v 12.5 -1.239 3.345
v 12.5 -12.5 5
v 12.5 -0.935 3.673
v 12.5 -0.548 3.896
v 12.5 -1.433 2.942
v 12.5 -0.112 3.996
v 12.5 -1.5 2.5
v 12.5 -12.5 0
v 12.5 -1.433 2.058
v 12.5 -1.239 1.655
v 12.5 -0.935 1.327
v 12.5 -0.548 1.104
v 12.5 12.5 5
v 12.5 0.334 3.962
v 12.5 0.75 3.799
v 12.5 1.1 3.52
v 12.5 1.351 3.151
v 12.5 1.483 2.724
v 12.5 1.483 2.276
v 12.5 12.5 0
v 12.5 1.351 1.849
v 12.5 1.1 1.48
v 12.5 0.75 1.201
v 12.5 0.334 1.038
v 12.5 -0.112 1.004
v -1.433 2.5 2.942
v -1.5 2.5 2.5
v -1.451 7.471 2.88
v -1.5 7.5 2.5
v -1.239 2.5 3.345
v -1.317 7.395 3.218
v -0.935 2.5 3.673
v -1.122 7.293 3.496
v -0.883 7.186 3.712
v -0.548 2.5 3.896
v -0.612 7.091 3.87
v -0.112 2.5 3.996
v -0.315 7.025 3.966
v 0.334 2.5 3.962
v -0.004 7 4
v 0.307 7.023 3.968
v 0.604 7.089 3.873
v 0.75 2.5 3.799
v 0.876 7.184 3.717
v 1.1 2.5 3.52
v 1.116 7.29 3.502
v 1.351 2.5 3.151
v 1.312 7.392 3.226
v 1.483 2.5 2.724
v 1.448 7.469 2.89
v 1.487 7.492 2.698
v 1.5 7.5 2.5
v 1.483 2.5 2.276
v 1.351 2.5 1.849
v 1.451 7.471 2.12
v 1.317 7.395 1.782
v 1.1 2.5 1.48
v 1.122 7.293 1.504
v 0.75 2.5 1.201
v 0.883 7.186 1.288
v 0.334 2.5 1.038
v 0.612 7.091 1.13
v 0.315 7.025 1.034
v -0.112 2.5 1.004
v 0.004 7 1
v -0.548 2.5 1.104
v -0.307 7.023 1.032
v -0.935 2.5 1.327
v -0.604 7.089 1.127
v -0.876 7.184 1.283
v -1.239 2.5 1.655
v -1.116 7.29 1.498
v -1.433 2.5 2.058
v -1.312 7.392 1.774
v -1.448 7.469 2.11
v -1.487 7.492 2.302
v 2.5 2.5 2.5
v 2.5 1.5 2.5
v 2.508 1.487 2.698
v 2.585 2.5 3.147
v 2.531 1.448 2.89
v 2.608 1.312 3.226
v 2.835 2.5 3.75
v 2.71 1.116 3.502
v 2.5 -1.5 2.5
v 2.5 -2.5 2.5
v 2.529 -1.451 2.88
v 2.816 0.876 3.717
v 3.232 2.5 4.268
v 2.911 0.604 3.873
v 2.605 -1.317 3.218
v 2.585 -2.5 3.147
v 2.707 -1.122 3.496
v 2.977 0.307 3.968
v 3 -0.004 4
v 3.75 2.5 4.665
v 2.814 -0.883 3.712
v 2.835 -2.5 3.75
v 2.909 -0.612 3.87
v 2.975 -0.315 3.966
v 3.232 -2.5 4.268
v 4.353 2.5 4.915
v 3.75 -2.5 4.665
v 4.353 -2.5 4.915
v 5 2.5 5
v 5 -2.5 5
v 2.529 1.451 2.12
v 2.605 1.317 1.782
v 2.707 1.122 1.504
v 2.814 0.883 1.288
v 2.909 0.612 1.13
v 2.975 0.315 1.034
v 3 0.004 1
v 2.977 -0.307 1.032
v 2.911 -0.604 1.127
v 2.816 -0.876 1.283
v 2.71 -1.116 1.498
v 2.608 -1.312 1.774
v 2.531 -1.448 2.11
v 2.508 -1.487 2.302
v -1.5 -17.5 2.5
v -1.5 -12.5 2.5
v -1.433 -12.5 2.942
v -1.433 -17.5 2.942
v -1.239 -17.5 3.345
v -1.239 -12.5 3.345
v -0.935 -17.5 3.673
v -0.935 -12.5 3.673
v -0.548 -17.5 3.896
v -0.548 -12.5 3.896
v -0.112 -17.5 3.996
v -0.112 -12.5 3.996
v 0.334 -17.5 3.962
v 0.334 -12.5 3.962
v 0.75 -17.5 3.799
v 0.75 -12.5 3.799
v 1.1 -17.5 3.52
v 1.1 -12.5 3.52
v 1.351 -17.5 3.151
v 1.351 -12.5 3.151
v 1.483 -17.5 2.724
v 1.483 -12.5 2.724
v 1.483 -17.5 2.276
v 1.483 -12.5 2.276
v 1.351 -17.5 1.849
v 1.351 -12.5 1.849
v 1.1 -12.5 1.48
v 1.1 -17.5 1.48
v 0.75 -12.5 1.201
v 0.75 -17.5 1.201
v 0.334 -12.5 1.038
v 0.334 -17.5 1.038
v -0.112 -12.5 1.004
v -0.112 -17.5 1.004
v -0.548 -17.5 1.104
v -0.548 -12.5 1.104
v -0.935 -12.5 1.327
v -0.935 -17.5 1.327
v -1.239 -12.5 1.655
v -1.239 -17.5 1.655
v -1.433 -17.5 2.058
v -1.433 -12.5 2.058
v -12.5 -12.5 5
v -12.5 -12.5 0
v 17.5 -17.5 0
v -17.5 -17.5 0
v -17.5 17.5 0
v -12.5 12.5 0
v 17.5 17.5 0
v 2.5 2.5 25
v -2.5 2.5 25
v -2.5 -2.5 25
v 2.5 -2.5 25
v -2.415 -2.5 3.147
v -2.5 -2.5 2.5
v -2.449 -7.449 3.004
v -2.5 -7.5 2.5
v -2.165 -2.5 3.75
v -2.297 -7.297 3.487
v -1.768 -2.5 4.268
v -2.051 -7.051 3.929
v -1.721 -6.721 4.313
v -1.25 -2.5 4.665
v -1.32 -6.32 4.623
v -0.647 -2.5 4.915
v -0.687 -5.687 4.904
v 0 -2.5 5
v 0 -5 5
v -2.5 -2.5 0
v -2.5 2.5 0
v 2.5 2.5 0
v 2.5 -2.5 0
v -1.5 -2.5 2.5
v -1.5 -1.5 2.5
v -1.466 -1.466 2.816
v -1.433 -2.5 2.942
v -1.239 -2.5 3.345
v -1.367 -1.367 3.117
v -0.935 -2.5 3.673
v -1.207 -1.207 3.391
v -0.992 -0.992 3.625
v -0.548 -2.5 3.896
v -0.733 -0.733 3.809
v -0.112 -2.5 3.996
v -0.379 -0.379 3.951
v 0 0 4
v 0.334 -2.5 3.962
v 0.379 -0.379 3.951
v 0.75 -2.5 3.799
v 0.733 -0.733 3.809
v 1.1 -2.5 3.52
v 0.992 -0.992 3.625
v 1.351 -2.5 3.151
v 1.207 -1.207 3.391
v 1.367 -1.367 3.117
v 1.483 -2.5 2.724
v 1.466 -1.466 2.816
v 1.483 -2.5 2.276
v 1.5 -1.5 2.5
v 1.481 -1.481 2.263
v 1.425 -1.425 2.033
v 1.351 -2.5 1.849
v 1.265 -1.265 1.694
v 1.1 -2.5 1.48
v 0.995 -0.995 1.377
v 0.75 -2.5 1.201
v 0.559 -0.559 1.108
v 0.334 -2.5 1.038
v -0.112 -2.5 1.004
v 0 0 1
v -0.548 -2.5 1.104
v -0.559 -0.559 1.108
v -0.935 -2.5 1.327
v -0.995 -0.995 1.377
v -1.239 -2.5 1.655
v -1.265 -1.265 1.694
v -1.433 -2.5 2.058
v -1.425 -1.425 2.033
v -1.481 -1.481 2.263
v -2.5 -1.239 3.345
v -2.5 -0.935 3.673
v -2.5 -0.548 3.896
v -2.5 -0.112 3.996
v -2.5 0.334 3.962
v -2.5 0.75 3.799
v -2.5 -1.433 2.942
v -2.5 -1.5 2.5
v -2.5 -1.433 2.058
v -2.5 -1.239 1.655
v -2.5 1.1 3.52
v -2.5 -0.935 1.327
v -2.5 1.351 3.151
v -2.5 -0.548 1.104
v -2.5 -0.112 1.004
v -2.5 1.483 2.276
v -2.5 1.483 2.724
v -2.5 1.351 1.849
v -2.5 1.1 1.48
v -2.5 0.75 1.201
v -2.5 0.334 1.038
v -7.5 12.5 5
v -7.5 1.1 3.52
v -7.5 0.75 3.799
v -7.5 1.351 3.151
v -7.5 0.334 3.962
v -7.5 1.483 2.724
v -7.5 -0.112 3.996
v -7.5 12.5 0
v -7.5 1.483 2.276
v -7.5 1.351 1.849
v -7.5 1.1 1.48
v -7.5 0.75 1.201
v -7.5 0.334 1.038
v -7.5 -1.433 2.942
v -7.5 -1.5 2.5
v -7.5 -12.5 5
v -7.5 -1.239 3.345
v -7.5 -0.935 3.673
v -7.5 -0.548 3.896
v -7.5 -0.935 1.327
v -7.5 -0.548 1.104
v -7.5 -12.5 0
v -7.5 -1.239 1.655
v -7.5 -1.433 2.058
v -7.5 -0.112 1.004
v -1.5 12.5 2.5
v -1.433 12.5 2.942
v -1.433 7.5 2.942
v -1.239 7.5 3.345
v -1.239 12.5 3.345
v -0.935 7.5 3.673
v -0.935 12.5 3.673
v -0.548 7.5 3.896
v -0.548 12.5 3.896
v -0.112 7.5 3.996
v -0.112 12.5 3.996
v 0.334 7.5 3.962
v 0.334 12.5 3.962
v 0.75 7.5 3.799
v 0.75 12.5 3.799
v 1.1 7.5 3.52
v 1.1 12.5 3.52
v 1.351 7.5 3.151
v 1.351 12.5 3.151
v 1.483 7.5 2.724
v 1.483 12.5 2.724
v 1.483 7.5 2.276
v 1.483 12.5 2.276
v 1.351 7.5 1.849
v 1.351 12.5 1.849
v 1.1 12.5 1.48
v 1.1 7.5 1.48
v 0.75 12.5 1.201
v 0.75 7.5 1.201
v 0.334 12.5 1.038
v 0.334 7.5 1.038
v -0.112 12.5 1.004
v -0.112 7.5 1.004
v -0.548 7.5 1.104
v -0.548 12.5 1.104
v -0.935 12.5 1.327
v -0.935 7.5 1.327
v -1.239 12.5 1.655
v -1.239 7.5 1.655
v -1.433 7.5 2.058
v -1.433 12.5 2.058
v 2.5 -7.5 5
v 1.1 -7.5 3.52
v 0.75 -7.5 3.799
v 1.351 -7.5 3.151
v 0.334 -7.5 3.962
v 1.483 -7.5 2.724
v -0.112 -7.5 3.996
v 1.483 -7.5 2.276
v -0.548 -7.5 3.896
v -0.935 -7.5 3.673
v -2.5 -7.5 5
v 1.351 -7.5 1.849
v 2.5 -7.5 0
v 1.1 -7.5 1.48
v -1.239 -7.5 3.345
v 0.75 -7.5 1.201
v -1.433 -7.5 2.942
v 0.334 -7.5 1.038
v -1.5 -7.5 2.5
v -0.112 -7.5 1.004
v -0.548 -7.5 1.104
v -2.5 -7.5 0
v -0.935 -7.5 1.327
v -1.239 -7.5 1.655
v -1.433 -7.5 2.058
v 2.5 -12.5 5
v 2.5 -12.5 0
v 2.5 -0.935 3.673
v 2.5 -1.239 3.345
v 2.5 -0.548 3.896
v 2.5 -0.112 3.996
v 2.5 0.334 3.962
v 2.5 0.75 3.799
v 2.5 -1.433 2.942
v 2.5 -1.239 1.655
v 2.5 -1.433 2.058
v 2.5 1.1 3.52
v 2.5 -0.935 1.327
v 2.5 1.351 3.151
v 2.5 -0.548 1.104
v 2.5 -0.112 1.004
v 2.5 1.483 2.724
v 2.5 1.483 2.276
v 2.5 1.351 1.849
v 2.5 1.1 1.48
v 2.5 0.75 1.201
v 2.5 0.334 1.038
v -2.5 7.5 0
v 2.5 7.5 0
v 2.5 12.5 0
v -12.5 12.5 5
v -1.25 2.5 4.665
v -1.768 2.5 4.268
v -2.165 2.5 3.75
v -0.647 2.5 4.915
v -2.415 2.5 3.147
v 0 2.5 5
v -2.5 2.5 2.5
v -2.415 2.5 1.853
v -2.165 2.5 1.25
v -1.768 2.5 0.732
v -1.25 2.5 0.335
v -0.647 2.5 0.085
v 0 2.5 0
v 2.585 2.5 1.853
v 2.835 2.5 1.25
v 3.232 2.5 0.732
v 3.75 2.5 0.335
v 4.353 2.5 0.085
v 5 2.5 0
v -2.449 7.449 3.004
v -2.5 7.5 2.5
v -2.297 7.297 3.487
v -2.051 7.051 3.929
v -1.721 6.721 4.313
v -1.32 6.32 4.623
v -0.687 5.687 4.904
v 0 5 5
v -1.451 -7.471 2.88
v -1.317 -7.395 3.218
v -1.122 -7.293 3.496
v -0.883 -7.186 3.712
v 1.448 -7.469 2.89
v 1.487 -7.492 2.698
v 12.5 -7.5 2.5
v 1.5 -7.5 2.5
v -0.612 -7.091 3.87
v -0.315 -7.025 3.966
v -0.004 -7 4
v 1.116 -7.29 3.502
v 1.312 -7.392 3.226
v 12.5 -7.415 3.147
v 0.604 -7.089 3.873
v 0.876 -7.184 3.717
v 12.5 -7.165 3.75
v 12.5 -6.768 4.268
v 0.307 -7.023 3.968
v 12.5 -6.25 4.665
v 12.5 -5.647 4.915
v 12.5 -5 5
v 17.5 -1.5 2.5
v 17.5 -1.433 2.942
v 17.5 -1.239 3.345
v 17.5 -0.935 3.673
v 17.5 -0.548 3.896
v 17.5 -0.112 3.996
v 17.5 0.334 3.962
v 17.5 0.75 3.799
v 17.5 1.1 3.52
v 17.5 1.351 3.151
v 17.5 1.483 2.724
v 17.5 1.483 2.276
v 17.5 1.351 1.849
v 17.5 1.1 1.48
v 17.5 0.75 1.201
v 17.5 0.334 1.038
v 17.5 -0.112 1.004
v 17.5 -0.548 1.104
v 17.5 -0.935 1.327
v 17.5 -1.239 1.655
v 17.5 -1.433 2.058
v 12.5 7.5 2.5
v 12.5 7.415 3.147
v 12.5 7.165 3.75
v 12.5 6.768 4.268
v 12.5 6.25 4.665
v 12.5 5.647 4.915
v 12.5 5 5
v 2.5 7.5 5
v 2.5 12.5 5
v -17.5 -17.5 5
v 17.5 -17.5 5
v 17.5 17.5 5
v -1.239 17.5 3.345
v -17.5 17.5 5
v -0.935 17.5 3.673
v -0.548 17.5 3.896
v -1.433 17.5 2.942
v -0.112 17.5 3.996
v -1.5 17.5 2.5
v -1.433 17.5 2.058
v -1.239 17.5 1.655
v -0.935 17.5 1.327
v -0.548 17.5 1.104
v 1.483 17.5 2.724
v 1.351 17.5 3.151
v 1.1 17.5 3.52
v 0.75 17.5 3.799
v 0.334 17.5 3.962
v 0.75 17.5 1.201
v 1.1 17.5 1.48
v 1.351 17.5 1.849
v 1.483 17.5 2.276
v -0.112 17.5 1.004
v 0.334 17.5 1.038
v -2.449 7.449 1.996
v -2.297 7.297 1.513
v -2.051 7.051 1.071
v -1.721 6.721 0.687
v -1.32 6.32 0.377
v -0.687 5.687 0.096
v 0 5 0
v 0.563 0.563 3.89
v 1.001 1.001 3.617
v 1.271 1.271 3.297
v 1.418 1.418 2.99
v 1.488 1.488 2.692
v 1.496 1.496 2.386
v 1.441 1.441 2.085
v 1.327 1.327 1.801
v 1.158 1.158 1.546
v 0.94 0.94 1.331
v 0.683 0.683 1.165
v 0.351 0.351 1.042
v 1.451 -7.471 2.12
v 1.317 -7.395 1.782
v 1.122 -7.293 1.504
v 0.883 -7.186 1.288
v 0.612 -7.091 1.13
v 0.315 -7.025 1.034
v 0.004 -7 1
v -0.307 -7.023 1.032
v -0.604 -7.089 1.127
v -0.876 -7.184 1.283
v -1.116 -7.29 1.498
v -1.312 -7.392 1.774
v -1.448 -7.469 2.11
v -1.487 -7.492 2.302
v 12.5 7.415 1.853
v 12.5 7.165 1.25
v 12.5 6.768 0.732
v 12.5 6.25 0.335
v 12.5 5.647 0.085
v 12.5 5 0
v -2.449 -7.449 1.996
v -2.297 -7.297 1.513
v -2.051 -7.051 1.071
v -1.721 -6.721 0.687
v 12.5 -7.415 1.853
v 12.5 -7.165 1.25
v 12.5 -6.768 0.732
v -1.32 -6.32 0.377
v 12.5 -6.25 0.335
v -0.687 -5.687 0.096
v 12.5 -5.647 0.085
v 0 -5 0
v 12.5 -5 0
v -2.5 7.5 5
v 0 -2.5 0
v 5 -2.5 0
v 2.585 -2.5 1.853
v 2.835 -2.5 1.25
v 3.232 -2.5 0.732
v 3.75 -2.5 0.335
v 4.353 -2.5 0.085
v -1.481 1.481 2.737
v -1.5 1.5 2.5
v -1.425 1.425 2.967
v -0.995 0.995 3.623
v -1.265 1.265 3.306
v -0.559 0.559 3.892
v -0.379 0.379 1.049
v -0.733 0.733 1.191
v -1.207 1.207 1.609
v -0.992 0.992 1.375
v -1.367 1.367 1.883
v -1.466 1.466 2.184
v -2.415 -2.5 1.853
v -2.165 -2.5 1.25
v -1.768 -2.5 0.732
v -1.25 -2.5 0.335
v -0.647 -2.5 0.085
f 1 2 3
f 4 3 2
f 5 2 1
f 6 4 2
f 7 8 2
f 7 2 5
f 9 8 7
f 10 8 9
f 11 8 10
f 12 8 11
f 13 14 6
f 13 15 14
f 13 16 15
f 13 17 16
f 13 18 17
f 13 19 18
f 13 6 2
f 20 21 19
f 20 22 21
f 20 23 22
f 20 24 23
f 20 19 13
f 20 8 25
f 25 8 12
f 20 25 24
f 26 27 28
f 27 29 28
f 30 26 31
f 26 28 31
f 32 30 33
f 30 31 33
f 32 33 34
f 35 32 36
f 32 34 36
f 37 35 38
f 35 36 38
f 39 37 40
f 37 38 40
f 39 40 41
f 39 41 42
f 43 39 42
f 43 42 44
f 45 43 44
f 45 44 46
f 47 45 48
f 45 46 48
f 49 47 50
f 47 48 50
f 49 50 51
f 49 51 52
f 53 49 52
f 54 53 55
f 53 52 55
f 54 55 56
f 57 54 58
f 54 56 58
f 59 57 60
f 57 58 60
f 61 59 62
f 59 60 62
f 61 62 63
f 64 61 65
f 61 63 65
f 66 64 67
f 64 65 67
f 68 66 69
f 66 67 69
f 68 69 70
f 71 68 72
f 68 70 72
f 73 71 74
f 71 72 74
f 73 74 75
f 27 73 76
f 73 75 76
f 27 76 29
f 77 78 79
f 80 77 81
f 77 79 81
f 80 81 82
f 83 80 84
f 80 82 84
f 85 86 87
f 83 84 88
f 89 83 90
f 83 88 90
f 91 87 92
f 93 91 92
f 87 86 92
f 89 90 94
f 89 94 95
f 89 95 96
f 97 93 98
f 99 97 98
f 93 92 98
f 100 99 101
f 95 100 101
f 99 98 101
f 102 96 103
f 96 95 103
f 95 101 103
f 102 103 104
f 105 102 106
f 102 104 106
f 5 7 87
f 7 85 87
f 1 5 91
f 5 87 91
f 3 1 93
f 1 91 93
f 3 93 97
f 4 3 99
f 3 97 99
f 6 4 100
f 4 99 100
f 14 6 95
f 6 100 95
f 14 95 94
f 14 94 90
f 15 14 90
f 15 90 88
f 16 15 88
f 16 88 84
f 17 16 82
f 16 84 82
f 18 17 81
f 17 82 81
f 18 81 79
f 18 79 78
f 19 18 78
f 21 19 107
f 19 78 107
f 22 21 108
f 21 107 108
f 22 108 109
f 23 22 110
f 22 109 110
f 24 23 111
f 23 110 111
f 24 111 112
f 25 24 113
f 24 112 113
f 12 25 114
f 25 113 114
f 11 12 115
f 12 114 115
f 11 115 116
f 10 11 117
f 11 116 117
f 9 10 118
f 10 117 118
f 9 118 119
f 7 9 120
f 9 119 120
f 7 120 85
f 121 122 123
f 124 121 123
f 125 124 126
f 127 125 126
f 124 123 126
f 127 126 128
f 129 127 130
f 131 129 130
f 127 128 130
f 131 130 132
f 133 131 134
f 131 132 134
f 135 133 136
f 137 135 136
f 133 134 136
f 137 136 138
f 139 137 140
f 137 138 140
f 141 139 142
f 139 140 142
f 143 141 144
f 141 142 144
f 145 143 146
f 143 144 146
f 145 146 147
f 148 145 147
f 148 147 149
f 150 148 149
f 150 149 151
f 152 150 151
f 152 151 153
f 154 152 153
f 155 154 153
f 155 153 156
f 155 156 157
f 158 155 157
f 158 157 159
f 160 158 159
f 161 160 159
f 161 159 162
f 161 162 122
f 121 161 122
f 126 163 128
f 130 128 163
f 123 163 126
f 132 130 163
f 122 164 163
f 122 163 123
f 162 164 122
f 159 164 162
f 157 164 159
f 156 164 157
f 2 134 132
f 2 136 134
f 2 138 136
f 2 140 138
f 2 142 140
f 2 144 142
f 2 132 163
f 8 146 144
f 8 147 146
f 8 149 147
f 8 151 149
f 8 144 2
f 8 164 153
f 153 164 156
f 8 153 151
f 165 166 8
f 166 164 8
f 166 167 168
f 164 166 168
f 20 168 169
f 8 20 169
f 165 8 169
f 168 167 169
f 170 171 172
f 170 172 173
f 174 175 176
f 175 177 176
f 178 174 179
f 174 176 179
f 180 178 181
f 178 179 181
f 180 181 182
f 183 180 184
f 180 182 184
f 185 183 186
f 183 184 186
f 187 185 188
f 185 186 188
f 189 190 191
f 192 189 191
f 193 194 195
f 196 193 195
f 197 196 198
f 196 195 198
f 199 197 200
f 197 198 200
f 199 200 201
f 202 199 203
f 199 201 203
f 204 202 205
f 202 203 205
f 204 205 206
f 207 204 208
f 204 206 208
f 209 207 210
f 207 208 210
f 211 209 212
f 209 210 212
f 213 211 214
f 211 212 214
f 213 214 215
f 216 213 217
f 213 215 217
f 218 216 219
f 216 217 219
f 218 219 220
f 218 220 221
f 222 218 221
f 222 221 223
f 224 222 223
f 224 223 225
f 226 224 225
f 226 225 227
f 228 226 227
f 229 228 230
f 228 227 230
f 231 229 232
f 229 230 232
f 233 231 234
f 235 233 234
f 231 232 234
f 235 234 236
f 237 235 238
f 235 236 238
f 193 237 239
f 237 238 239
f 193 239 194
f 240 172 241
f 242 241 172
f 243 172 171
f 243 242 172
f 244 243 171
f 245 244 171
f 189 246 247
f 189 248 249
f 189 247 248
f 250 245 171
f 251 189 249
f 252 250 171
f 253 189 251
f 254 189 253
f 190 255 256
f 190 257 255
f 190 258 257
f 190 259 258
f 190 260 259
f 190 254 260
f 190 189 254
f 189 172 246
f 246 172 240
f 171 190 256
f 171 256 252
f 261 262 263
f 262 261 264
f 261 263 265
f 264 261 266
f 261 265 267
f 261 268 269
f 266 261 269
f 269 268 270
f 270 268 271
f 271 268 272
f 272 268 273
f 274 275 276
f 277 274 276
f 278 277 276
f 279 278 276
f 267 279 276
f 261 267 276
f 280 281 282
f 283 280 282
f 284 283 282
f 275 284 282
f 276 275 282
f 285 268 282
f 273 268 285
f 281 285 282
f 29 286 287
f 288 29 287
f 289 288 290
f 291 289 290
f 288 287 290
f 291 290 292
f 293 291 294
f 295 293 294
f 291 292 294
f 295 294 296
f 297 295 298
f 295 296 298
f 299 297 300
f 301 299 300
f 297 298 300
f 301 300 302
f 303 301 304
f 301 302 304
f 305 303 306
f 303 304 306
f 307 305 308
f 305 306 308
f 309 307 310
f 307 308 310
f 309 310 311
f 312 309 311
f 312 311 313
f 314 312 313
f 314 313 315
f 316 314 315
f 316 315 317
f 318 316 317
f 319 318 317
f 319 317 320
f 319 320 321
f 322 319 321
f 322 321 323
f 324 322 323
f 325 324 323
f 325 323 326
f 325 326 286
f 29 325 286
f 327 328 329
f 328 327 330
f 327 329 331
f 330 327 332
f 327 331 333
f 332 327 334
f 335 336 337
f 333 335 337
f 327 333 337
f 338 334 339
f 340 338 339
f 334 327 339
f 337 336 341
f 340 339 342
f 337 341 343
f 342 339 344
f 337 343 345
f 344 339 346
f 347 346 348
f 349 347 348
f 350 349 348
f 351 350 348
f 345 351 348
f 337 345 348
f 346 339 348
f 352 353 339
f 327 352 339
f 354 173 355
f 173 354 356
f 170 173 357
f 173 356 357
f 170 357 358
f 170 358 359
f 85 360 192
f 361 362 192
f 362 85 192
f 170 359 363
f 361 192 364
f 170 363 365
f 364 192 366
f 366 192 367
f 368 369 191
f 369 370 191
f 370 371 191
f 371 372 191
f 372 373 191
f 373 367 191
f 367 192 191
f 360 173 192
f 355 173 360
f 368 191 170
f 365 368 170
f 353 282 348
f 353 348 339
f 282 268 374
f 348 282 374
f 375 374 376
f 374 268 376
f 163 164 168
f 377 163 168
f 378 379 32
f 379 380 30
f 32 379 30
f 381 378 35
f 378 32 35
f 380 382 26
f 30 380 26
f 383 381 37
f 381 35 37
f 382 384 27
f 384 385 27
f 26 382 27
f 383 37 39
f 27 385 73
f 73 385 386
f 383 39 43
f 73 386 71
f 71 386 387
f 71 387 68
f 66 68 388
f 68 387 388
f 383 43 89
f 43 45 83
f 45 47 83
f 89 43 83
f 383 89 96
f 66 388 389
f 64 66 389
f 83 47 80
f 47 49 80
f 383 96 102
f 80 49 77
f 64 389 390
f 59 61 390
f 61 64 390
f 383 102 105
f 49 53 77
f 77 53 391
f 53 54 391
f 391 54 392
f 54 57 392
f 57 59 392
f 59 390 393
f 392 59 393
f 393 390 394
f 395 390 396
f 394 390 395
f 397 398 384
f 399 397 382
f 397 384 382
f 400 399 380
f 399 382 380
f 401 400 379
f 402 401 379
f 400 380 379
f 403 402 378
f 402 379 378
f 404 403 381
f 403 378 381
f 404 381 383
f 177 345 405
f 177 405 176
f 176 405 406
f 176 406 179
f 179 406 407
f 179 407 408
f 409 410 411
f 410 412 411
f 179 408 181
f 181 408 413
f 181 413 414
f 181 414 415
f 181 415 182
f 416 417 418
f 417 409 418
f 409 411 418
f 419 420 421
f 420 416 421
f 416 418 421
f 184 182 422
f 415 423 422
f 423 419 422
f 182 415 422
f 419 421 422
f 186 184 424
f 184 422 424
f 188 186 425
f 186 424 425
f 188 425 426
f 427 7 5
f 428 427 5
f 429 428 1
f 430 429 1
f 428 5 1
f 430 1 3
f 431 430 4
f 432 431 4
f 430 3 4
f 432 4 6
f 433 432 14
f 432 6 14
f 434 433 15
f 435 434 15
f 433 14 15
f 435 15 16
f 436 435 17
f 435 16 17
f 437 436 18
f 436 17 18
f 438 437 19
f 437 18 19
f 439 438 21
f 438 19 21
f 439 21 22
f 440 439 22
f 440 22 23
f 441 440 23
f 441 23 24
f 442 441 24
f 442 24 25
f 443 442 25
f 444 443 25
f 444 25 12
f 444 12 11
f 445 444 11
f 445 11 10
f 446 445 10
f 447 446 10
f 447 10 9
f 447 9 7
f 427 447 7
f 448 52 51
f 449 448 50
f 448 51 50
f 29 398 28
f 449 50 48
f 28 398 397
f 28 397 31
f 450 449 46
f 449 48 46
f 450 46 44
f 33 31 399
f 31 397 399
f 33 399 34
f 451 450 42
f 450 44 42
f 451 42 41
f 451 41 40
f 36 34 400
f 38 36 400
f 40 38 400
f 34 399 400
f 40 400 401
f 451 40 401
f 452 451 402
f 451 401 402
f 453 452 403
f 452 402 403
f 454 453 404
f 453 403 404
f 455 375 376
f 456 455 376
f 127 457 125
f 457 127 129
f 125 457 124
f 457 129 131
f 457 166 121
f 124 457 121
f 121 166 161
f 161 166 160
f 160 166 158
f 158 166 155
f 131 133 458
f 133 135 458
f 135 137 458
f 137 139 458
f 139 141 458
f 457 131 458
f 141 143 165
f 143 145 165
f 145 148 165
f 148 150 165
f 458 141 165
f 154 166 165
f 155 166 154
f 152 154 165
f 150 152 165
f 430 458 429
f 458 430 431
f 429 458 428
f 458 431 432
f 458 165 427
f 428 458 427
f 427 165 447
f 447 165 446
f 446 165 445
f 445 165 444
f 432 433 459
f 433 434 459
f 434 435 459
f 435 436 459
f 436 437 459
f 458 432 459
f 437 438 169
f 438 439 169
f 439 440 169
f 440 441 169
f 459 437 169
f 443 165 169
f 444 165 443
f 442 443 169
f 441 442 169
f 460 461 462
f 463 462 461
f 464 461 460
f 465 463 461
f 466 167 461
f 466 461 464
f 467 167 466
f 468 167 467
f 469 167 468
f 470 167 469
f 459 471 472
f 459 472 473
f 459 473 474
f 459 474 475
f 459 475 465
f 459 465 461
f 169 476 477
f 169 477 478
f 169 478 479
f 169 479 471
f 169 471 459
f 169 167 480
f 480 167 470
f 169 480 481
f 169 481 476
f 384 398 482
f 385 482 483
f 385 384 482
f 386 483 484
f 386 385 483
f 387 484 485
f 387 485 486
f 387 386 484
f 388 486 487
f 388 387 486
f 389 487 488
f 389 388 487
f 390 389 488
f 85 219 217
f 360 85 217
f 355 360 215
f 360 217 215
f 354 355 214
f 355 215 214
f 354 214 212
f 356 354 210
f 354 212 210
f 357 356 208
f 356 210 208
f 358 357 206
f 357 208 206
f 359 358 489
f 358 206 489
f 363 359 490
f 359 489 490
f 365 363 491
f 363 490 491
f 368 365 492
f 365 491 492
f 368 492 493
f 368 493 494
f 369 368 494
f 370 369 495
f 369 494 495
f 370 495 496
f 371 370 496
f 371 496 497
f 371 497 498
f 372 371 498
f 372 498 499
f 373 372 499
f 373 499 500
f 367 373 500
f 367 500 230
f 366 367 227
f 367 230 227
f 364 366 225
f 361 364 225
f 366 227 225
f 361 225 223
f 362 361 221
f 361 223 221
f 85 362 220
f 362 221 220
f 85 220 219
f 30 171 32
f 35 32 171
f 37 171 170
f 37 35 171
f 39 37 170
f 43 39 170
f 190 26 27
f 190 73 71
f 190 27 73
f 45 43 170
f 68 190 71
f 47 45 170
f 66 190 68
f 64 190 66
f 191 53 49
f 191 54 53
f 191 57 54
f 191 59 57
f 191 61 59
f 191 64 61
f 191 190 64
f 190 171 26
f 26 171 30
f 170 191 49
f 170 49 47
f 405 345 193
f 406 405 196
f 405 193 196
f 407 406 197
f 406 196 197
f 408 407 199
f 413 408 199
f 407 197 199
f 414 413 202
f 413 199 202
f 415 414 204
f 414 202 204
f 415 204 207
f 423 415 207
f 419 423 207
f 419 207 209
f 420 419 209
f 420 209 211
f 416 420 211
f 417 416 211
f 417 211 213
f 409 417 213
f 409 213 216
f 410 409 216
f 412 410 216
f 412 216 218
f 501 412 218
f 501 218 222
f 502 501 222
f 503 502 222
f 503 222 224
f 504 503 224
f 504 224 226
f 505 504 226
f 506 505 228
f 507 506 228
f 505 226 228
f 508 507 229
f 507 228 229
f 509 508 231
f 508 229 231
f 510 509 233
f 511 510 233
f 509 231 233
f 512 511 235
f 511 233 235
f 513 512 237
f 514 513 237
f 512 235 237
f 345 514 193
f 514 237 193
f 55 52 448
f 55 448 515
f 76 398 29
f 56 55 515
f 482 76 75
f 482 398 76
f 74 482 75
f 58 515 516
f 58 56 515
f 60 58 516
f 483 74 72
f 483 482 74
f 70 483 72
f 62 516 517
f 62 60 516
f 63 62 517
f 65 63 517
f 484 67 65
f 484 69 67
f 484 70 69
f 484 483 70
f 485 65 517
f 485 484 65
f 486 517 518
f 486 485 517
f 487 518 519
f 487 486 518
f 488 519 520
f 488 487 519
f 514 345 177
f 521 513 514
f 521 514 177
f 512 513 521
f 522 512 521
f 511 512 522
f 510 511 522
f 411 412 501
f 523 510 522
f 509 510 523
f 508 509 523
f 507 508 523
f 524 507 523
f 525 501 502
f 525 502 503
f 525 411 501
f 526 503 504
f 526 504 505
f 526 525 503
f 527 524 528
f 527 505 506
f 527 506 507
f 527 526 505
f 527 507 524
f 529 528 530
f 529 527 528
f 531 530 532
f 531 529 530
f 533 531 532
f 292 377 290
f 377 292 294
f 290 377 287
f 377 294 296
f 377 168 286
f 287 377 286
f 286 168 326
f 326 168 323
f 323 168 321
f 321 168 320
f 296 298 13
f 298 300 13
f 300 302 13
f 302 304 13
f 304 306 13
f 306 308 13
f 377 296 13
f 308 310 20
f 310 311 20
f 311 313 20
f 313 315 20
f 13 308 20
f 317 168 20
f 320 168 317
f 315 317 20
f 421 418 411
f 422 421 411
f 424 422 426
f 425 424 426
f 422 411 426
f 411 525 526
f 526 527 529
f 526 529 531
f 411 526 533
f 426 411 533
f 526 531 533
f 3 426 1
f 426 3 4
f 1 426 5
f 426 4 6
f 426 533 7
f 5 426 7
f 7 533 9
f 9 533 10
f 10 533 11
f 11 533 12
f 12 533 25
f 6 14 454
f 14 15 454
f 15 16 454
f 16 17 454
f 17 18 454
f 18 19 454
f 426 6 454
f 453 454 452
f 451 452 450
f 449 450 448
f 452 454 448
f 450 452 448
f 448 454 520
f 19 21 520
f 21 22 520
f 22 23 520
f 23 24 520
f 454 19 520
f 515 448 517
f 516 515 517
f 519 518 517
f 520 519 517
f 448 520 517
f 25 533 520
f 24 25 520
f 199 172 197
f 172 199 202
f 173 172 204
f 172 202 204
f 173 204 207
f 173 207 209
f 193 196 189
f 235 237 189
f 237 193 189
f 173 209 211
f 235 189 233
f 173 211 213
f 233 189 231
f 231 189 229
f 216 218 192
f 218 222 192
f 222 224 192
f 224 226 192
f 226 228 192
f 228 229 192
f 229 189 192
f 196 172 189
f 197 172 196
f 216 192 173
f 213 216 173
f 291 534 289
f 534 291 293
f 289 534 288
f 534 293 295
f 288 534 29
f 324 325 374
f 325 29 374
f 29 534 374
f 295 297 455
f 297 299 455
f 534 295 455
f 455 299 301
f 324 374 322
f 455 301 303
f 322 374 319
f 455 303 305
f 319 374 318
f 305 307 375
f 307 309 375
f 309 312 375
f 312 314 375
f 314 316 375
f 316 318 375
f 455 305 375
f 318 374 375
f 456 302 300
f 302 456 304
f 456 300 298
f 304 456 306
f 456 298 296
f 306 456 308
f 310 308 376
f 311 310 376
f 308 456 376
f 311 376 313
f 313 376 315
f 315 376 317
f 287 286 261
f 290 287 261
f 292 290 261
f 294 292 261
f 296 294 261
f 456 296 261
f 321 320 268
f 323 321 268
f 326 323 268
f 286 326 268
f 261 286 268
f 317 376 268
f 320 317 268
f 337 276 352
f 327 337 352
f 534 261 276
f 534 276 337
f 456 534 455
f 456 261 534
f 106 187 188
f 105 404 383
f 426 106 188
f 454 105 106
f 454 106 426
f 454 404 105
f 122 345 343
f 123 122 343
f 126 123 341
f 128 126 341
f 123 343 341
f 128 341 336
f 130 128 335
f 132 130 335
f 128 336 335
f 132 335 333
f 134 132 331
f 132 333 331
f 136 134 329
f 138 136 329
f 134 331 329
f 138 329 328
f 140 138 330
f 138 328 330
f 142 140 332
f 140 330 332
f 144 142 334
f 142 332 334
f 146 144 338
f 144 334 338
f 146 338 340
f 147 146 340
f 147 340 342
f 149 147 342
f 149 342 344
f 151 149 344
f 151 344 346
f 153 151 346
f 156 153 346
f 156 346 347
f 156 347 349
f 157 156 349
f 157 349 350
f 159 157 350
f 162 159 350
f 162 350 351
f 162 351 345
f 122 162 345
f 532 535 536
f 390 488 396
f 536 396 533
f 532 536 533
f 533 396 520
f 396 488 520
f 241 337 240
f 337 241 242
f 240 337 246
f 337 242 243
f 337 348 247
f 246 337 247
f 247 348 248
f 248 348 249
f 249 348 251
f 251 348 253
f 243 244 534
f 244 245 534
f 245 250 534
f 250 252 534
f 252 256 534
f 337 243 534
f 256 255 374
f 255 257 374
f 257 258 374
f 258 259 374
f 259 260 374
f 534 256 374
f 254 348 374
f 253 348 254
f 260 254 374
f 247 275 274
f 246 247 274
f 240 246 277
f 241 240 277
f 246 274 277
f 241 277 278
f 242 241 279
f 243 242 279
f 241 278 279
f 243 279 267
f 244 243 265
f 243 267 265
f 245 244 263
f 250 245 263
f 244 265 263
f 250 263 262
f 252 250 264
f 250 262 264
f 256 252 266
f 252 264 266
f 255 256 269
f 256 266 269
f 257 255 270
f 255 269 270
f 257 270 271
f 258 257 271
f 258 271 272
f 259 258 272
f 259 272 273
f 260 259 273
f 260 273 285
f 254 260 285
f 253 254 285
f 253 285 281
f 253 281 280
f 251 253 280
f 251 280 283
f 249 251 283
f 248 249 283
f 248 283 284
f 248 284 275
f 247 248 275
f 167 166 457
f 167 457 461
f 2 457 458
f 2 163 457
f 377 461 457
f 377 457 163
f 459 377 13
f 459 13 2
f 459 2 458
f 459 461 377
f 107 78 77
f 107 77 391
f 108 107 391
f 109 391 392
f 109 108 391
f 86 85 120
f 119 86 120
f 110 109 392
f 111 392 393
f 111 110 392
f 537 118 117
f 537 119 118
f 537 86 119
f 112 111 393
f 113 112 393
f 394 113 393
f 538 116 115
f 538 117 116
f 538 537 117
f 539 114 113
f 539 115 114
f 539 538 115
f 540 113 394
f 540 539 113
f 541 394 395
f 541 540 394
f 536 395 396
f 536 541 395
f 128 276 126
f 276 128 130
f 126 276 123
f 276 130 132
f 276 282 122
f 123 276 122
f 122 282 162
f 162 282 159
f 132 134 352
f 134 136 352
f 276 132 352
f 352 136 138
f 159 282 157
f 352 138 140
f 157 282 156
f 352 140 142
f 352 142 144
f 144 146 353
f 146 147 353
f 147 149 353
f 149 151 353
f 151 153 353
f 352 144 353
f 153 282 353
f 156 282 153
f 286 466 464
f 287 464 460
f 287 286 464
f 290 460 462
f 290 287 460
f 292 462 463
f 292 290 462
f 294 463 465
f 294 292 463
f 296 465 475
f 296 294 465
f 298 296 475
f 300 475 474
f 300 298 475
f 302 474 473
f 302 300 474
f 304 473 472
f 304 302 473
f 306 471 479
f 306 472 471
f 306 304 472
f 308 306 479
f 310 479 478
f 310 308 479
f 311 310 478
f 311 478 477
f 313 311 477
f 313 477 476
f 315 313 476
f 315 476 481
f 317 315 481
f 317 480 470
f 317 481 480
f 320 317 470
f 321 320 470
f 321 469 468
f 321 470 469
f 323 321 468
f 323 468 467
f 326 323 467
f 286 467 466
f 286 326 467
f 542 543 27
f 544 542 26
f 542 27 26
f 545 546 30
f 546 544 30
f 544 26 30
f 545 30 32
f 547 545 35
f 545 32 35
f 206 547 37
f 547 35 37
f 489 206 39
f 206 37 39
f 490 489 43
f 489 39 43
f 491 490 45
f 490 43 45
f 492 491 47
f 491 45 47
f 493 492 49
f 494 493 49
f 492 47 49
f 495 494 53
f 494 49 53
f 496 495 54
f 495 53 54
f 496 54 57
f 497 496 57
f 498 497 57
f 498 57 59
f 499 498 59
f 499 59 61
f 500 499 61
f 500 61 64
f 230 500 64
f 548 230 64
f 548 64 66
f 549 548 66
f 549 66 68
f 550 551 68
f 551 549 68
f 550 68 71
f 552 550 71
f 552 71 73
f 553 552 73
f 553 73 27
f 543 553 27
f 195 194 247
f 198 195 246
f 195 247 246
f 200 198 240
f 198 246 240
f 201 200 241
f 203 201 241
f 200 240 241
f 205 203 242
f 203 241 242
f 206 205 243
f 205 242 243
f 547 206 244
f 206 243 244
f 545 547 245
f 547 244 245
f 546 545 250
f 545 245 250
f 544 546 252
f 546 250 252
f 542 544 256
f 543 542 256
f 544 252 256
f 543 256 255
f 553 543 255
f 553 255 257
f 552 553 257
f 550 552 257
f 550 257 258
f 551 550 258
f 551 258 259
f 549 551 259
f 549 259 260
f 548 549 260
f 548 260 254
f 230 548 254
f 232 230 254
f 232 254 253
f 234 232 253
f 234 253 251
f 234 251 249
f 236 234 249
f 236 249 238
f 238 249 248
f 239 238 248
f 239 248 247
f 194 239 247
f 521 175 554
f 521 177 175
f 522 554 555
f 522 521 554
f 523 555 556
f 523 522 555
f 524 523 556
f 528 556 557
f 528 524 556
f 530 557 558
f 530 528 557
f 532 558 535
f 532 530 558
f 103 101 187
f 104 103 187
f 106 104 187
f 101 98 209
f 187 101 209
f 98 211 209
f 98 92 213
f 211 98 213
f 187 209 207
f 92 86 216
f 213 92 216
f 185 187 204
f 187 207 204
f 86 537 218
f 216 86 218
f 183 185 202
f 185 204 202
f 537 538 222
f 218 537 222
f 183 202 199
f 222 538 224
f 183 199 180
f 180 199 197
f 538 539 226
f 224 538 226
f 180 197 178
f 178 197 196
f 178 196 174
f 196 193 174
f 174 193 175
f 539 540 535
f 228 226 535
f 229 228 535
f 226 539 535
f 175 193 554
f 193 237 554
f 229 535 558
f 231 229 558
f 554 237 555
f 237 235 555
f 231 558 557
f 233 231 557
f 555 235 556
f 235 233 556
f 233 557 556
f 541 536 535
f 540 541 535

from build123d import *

# Parameters (mm, degrees)
F1_DEPTH       = 5
F2_DEPTH       = 5
F0_W           = 5
F0_H           = 5
F3_DEPTH       = 25
F4_R           = 2.49999
F5_W           = 35
F5_H           = 35
F5_W_2         = 25
F5_H_2         = 25
F6_DEPTH       = 5
F7_R           = 1.5
F8_DEPTH       = 25.001
F9_R           = 1.5
F10_DEPTH      = 30.001
F10_DEPTH_BACK = 5.001


# Not quite as in the source:
# - a fillet or chamfer is up to 0.001 mm smaller than in the source, because OpenCascade refuses the exact size


with BuildPart() as f1:
    # F0 (on Top) → F1 (new body)
    with BuildSketch(Plane.XY):
        Polygon((-2.5, -2.5), (-2.5, 2.5), (-2.5, 7.5), (2.5, 7.5), (2.5, 12.5), (-7.5, 12.5), (-7.5, -12.5), (2.5, -12.5), (2.5, -7.5), (-2.5, -7.5), align=None)
    extrude(amount=F1_DEPTH)


with BuildPart() as f2:
    # F0 (on Top) → F2 (new body)
    with BuildSketch(Plane.XY):
        Polygon((-2.5, 7.5), (-2.5, 2.5), (2.5, 2.5), (2.5, -2.5), (-2.5, -2.5), (-2.5, -7.5), (2.5, -7.5), (12.5, -7.5), (12.5, 7.5), (2.5, 7.5), align=None)
    extrude(amount=F2_DEPTH)

    # F4 (radius 2.5 in the source; OpenCascade refuses exactly that, so slightly less here)
    f4_edges = [f2.edges().sort_by_distance(p)[0] for p in [
        (5, -7.5, 5),
        (5, -7.5, 0),
        (5, 7.5, 5),
        (5, 7.5, 0),
        (2.5, 0, 5),
        (2.5, 0, 0),
        (-2.5, 5, 5),
        (-2.5, 5, 0),
        (-2.5, -5, 0),
        (-2.5, -5, 5),
    ]]
    fillet(f4_edges, radius=F4_R)


with BuildPart() as f3:
    # F0 (on Top) → F3 (new body)
    with BuildSketch(Plane.XY):
        Rectangle(F0_W, F0_H)
    extrude(amount=F3_DEPTH)


with BuildPart() as f6:
    # F5 (on Top) → F6 (new body)
    with BuildSketch(Plane.XY):
        Rectangle(F5_W, F5_H)
        Rectangle(F5_W_2, F5_H_2, mode=Mode.SUBTRACT)
    extrude(amount=F6_DEPTH)


with BuildPart() as f8_tool:
    # F7 (on face) → F8 (new body, through all)
    with BuildSketch(Plane(origin=(-7.5, 0, 0), x_dir=(0, -1, 0), z_dir=(-1, 0, 0))):
        with Locations((0, 2.5)):
            Circle(F7_R)
    extrude(amount=-F8_DEPTH)


with BuildPart() as f1_1:
    add(f1.part)

    # F8: cut by f8_tool
    add(f8_tool.part, mode=Mode.SUBTRACT)


with BuildPart() as f2_1:
    add(f2.part)

    # F8: cut by f8_tool
    add(f8_tool.part, mode=Mode.SUBTRACT)


with BuildPart() as f3_1:
    add(f3.part)

    # F8: cut by f8_tool
    add(f8_tool.part, mode=Mode.SUBTRACT)


with BuildPart() as f6_1:
    add(f6.part)

    # F8: cut by f8_tool
    add(f8_tool.part, mode=Mode.SUBTRACT)


with BuildPart() as f10_tool:
    # F9 (on face) → F10 (new body, two sides)
    with BuildSketch(Plane(origin=(0, 12.5, 0), x_dir=(-1, 0, 0), z_dir=(0, 1, 0))) as f10_sk:
        with Locations((0, 2.5)):
            Circle(F9_R)
    extrude(amount=-F10_DEPTH)
    extrude(f10_sk.sketch, amount=F10_DEPTH_BACK)


with BuildPart() as f1_2:
    add(f1_1.part)

    # F10: cut by f10_tool
    add(f10_tool.part, mode=Mode.SUBTRACT)


with BuildPart() as f2_2:
    add(f2_1.part)

    # F10: cut by f10_tool
    add(f10_tool.part, mode=Mode.SUBTRACT)


with BuildPart() as f3_2:
    add(f3_1.part)

    # F10: cut by f10_tool
    add(f10_tool.part, mode=Mode.SUBTRACT)


with BuildPart() as f6_2:
    add(f6_1.part)

    # F10: cut by f10_tool
    add(f10_tool.part, mode=Mode.SUBTRACT)


solid = Compound([f1_2.part, f2_2.part, f3_2.part, f6_2.part])
